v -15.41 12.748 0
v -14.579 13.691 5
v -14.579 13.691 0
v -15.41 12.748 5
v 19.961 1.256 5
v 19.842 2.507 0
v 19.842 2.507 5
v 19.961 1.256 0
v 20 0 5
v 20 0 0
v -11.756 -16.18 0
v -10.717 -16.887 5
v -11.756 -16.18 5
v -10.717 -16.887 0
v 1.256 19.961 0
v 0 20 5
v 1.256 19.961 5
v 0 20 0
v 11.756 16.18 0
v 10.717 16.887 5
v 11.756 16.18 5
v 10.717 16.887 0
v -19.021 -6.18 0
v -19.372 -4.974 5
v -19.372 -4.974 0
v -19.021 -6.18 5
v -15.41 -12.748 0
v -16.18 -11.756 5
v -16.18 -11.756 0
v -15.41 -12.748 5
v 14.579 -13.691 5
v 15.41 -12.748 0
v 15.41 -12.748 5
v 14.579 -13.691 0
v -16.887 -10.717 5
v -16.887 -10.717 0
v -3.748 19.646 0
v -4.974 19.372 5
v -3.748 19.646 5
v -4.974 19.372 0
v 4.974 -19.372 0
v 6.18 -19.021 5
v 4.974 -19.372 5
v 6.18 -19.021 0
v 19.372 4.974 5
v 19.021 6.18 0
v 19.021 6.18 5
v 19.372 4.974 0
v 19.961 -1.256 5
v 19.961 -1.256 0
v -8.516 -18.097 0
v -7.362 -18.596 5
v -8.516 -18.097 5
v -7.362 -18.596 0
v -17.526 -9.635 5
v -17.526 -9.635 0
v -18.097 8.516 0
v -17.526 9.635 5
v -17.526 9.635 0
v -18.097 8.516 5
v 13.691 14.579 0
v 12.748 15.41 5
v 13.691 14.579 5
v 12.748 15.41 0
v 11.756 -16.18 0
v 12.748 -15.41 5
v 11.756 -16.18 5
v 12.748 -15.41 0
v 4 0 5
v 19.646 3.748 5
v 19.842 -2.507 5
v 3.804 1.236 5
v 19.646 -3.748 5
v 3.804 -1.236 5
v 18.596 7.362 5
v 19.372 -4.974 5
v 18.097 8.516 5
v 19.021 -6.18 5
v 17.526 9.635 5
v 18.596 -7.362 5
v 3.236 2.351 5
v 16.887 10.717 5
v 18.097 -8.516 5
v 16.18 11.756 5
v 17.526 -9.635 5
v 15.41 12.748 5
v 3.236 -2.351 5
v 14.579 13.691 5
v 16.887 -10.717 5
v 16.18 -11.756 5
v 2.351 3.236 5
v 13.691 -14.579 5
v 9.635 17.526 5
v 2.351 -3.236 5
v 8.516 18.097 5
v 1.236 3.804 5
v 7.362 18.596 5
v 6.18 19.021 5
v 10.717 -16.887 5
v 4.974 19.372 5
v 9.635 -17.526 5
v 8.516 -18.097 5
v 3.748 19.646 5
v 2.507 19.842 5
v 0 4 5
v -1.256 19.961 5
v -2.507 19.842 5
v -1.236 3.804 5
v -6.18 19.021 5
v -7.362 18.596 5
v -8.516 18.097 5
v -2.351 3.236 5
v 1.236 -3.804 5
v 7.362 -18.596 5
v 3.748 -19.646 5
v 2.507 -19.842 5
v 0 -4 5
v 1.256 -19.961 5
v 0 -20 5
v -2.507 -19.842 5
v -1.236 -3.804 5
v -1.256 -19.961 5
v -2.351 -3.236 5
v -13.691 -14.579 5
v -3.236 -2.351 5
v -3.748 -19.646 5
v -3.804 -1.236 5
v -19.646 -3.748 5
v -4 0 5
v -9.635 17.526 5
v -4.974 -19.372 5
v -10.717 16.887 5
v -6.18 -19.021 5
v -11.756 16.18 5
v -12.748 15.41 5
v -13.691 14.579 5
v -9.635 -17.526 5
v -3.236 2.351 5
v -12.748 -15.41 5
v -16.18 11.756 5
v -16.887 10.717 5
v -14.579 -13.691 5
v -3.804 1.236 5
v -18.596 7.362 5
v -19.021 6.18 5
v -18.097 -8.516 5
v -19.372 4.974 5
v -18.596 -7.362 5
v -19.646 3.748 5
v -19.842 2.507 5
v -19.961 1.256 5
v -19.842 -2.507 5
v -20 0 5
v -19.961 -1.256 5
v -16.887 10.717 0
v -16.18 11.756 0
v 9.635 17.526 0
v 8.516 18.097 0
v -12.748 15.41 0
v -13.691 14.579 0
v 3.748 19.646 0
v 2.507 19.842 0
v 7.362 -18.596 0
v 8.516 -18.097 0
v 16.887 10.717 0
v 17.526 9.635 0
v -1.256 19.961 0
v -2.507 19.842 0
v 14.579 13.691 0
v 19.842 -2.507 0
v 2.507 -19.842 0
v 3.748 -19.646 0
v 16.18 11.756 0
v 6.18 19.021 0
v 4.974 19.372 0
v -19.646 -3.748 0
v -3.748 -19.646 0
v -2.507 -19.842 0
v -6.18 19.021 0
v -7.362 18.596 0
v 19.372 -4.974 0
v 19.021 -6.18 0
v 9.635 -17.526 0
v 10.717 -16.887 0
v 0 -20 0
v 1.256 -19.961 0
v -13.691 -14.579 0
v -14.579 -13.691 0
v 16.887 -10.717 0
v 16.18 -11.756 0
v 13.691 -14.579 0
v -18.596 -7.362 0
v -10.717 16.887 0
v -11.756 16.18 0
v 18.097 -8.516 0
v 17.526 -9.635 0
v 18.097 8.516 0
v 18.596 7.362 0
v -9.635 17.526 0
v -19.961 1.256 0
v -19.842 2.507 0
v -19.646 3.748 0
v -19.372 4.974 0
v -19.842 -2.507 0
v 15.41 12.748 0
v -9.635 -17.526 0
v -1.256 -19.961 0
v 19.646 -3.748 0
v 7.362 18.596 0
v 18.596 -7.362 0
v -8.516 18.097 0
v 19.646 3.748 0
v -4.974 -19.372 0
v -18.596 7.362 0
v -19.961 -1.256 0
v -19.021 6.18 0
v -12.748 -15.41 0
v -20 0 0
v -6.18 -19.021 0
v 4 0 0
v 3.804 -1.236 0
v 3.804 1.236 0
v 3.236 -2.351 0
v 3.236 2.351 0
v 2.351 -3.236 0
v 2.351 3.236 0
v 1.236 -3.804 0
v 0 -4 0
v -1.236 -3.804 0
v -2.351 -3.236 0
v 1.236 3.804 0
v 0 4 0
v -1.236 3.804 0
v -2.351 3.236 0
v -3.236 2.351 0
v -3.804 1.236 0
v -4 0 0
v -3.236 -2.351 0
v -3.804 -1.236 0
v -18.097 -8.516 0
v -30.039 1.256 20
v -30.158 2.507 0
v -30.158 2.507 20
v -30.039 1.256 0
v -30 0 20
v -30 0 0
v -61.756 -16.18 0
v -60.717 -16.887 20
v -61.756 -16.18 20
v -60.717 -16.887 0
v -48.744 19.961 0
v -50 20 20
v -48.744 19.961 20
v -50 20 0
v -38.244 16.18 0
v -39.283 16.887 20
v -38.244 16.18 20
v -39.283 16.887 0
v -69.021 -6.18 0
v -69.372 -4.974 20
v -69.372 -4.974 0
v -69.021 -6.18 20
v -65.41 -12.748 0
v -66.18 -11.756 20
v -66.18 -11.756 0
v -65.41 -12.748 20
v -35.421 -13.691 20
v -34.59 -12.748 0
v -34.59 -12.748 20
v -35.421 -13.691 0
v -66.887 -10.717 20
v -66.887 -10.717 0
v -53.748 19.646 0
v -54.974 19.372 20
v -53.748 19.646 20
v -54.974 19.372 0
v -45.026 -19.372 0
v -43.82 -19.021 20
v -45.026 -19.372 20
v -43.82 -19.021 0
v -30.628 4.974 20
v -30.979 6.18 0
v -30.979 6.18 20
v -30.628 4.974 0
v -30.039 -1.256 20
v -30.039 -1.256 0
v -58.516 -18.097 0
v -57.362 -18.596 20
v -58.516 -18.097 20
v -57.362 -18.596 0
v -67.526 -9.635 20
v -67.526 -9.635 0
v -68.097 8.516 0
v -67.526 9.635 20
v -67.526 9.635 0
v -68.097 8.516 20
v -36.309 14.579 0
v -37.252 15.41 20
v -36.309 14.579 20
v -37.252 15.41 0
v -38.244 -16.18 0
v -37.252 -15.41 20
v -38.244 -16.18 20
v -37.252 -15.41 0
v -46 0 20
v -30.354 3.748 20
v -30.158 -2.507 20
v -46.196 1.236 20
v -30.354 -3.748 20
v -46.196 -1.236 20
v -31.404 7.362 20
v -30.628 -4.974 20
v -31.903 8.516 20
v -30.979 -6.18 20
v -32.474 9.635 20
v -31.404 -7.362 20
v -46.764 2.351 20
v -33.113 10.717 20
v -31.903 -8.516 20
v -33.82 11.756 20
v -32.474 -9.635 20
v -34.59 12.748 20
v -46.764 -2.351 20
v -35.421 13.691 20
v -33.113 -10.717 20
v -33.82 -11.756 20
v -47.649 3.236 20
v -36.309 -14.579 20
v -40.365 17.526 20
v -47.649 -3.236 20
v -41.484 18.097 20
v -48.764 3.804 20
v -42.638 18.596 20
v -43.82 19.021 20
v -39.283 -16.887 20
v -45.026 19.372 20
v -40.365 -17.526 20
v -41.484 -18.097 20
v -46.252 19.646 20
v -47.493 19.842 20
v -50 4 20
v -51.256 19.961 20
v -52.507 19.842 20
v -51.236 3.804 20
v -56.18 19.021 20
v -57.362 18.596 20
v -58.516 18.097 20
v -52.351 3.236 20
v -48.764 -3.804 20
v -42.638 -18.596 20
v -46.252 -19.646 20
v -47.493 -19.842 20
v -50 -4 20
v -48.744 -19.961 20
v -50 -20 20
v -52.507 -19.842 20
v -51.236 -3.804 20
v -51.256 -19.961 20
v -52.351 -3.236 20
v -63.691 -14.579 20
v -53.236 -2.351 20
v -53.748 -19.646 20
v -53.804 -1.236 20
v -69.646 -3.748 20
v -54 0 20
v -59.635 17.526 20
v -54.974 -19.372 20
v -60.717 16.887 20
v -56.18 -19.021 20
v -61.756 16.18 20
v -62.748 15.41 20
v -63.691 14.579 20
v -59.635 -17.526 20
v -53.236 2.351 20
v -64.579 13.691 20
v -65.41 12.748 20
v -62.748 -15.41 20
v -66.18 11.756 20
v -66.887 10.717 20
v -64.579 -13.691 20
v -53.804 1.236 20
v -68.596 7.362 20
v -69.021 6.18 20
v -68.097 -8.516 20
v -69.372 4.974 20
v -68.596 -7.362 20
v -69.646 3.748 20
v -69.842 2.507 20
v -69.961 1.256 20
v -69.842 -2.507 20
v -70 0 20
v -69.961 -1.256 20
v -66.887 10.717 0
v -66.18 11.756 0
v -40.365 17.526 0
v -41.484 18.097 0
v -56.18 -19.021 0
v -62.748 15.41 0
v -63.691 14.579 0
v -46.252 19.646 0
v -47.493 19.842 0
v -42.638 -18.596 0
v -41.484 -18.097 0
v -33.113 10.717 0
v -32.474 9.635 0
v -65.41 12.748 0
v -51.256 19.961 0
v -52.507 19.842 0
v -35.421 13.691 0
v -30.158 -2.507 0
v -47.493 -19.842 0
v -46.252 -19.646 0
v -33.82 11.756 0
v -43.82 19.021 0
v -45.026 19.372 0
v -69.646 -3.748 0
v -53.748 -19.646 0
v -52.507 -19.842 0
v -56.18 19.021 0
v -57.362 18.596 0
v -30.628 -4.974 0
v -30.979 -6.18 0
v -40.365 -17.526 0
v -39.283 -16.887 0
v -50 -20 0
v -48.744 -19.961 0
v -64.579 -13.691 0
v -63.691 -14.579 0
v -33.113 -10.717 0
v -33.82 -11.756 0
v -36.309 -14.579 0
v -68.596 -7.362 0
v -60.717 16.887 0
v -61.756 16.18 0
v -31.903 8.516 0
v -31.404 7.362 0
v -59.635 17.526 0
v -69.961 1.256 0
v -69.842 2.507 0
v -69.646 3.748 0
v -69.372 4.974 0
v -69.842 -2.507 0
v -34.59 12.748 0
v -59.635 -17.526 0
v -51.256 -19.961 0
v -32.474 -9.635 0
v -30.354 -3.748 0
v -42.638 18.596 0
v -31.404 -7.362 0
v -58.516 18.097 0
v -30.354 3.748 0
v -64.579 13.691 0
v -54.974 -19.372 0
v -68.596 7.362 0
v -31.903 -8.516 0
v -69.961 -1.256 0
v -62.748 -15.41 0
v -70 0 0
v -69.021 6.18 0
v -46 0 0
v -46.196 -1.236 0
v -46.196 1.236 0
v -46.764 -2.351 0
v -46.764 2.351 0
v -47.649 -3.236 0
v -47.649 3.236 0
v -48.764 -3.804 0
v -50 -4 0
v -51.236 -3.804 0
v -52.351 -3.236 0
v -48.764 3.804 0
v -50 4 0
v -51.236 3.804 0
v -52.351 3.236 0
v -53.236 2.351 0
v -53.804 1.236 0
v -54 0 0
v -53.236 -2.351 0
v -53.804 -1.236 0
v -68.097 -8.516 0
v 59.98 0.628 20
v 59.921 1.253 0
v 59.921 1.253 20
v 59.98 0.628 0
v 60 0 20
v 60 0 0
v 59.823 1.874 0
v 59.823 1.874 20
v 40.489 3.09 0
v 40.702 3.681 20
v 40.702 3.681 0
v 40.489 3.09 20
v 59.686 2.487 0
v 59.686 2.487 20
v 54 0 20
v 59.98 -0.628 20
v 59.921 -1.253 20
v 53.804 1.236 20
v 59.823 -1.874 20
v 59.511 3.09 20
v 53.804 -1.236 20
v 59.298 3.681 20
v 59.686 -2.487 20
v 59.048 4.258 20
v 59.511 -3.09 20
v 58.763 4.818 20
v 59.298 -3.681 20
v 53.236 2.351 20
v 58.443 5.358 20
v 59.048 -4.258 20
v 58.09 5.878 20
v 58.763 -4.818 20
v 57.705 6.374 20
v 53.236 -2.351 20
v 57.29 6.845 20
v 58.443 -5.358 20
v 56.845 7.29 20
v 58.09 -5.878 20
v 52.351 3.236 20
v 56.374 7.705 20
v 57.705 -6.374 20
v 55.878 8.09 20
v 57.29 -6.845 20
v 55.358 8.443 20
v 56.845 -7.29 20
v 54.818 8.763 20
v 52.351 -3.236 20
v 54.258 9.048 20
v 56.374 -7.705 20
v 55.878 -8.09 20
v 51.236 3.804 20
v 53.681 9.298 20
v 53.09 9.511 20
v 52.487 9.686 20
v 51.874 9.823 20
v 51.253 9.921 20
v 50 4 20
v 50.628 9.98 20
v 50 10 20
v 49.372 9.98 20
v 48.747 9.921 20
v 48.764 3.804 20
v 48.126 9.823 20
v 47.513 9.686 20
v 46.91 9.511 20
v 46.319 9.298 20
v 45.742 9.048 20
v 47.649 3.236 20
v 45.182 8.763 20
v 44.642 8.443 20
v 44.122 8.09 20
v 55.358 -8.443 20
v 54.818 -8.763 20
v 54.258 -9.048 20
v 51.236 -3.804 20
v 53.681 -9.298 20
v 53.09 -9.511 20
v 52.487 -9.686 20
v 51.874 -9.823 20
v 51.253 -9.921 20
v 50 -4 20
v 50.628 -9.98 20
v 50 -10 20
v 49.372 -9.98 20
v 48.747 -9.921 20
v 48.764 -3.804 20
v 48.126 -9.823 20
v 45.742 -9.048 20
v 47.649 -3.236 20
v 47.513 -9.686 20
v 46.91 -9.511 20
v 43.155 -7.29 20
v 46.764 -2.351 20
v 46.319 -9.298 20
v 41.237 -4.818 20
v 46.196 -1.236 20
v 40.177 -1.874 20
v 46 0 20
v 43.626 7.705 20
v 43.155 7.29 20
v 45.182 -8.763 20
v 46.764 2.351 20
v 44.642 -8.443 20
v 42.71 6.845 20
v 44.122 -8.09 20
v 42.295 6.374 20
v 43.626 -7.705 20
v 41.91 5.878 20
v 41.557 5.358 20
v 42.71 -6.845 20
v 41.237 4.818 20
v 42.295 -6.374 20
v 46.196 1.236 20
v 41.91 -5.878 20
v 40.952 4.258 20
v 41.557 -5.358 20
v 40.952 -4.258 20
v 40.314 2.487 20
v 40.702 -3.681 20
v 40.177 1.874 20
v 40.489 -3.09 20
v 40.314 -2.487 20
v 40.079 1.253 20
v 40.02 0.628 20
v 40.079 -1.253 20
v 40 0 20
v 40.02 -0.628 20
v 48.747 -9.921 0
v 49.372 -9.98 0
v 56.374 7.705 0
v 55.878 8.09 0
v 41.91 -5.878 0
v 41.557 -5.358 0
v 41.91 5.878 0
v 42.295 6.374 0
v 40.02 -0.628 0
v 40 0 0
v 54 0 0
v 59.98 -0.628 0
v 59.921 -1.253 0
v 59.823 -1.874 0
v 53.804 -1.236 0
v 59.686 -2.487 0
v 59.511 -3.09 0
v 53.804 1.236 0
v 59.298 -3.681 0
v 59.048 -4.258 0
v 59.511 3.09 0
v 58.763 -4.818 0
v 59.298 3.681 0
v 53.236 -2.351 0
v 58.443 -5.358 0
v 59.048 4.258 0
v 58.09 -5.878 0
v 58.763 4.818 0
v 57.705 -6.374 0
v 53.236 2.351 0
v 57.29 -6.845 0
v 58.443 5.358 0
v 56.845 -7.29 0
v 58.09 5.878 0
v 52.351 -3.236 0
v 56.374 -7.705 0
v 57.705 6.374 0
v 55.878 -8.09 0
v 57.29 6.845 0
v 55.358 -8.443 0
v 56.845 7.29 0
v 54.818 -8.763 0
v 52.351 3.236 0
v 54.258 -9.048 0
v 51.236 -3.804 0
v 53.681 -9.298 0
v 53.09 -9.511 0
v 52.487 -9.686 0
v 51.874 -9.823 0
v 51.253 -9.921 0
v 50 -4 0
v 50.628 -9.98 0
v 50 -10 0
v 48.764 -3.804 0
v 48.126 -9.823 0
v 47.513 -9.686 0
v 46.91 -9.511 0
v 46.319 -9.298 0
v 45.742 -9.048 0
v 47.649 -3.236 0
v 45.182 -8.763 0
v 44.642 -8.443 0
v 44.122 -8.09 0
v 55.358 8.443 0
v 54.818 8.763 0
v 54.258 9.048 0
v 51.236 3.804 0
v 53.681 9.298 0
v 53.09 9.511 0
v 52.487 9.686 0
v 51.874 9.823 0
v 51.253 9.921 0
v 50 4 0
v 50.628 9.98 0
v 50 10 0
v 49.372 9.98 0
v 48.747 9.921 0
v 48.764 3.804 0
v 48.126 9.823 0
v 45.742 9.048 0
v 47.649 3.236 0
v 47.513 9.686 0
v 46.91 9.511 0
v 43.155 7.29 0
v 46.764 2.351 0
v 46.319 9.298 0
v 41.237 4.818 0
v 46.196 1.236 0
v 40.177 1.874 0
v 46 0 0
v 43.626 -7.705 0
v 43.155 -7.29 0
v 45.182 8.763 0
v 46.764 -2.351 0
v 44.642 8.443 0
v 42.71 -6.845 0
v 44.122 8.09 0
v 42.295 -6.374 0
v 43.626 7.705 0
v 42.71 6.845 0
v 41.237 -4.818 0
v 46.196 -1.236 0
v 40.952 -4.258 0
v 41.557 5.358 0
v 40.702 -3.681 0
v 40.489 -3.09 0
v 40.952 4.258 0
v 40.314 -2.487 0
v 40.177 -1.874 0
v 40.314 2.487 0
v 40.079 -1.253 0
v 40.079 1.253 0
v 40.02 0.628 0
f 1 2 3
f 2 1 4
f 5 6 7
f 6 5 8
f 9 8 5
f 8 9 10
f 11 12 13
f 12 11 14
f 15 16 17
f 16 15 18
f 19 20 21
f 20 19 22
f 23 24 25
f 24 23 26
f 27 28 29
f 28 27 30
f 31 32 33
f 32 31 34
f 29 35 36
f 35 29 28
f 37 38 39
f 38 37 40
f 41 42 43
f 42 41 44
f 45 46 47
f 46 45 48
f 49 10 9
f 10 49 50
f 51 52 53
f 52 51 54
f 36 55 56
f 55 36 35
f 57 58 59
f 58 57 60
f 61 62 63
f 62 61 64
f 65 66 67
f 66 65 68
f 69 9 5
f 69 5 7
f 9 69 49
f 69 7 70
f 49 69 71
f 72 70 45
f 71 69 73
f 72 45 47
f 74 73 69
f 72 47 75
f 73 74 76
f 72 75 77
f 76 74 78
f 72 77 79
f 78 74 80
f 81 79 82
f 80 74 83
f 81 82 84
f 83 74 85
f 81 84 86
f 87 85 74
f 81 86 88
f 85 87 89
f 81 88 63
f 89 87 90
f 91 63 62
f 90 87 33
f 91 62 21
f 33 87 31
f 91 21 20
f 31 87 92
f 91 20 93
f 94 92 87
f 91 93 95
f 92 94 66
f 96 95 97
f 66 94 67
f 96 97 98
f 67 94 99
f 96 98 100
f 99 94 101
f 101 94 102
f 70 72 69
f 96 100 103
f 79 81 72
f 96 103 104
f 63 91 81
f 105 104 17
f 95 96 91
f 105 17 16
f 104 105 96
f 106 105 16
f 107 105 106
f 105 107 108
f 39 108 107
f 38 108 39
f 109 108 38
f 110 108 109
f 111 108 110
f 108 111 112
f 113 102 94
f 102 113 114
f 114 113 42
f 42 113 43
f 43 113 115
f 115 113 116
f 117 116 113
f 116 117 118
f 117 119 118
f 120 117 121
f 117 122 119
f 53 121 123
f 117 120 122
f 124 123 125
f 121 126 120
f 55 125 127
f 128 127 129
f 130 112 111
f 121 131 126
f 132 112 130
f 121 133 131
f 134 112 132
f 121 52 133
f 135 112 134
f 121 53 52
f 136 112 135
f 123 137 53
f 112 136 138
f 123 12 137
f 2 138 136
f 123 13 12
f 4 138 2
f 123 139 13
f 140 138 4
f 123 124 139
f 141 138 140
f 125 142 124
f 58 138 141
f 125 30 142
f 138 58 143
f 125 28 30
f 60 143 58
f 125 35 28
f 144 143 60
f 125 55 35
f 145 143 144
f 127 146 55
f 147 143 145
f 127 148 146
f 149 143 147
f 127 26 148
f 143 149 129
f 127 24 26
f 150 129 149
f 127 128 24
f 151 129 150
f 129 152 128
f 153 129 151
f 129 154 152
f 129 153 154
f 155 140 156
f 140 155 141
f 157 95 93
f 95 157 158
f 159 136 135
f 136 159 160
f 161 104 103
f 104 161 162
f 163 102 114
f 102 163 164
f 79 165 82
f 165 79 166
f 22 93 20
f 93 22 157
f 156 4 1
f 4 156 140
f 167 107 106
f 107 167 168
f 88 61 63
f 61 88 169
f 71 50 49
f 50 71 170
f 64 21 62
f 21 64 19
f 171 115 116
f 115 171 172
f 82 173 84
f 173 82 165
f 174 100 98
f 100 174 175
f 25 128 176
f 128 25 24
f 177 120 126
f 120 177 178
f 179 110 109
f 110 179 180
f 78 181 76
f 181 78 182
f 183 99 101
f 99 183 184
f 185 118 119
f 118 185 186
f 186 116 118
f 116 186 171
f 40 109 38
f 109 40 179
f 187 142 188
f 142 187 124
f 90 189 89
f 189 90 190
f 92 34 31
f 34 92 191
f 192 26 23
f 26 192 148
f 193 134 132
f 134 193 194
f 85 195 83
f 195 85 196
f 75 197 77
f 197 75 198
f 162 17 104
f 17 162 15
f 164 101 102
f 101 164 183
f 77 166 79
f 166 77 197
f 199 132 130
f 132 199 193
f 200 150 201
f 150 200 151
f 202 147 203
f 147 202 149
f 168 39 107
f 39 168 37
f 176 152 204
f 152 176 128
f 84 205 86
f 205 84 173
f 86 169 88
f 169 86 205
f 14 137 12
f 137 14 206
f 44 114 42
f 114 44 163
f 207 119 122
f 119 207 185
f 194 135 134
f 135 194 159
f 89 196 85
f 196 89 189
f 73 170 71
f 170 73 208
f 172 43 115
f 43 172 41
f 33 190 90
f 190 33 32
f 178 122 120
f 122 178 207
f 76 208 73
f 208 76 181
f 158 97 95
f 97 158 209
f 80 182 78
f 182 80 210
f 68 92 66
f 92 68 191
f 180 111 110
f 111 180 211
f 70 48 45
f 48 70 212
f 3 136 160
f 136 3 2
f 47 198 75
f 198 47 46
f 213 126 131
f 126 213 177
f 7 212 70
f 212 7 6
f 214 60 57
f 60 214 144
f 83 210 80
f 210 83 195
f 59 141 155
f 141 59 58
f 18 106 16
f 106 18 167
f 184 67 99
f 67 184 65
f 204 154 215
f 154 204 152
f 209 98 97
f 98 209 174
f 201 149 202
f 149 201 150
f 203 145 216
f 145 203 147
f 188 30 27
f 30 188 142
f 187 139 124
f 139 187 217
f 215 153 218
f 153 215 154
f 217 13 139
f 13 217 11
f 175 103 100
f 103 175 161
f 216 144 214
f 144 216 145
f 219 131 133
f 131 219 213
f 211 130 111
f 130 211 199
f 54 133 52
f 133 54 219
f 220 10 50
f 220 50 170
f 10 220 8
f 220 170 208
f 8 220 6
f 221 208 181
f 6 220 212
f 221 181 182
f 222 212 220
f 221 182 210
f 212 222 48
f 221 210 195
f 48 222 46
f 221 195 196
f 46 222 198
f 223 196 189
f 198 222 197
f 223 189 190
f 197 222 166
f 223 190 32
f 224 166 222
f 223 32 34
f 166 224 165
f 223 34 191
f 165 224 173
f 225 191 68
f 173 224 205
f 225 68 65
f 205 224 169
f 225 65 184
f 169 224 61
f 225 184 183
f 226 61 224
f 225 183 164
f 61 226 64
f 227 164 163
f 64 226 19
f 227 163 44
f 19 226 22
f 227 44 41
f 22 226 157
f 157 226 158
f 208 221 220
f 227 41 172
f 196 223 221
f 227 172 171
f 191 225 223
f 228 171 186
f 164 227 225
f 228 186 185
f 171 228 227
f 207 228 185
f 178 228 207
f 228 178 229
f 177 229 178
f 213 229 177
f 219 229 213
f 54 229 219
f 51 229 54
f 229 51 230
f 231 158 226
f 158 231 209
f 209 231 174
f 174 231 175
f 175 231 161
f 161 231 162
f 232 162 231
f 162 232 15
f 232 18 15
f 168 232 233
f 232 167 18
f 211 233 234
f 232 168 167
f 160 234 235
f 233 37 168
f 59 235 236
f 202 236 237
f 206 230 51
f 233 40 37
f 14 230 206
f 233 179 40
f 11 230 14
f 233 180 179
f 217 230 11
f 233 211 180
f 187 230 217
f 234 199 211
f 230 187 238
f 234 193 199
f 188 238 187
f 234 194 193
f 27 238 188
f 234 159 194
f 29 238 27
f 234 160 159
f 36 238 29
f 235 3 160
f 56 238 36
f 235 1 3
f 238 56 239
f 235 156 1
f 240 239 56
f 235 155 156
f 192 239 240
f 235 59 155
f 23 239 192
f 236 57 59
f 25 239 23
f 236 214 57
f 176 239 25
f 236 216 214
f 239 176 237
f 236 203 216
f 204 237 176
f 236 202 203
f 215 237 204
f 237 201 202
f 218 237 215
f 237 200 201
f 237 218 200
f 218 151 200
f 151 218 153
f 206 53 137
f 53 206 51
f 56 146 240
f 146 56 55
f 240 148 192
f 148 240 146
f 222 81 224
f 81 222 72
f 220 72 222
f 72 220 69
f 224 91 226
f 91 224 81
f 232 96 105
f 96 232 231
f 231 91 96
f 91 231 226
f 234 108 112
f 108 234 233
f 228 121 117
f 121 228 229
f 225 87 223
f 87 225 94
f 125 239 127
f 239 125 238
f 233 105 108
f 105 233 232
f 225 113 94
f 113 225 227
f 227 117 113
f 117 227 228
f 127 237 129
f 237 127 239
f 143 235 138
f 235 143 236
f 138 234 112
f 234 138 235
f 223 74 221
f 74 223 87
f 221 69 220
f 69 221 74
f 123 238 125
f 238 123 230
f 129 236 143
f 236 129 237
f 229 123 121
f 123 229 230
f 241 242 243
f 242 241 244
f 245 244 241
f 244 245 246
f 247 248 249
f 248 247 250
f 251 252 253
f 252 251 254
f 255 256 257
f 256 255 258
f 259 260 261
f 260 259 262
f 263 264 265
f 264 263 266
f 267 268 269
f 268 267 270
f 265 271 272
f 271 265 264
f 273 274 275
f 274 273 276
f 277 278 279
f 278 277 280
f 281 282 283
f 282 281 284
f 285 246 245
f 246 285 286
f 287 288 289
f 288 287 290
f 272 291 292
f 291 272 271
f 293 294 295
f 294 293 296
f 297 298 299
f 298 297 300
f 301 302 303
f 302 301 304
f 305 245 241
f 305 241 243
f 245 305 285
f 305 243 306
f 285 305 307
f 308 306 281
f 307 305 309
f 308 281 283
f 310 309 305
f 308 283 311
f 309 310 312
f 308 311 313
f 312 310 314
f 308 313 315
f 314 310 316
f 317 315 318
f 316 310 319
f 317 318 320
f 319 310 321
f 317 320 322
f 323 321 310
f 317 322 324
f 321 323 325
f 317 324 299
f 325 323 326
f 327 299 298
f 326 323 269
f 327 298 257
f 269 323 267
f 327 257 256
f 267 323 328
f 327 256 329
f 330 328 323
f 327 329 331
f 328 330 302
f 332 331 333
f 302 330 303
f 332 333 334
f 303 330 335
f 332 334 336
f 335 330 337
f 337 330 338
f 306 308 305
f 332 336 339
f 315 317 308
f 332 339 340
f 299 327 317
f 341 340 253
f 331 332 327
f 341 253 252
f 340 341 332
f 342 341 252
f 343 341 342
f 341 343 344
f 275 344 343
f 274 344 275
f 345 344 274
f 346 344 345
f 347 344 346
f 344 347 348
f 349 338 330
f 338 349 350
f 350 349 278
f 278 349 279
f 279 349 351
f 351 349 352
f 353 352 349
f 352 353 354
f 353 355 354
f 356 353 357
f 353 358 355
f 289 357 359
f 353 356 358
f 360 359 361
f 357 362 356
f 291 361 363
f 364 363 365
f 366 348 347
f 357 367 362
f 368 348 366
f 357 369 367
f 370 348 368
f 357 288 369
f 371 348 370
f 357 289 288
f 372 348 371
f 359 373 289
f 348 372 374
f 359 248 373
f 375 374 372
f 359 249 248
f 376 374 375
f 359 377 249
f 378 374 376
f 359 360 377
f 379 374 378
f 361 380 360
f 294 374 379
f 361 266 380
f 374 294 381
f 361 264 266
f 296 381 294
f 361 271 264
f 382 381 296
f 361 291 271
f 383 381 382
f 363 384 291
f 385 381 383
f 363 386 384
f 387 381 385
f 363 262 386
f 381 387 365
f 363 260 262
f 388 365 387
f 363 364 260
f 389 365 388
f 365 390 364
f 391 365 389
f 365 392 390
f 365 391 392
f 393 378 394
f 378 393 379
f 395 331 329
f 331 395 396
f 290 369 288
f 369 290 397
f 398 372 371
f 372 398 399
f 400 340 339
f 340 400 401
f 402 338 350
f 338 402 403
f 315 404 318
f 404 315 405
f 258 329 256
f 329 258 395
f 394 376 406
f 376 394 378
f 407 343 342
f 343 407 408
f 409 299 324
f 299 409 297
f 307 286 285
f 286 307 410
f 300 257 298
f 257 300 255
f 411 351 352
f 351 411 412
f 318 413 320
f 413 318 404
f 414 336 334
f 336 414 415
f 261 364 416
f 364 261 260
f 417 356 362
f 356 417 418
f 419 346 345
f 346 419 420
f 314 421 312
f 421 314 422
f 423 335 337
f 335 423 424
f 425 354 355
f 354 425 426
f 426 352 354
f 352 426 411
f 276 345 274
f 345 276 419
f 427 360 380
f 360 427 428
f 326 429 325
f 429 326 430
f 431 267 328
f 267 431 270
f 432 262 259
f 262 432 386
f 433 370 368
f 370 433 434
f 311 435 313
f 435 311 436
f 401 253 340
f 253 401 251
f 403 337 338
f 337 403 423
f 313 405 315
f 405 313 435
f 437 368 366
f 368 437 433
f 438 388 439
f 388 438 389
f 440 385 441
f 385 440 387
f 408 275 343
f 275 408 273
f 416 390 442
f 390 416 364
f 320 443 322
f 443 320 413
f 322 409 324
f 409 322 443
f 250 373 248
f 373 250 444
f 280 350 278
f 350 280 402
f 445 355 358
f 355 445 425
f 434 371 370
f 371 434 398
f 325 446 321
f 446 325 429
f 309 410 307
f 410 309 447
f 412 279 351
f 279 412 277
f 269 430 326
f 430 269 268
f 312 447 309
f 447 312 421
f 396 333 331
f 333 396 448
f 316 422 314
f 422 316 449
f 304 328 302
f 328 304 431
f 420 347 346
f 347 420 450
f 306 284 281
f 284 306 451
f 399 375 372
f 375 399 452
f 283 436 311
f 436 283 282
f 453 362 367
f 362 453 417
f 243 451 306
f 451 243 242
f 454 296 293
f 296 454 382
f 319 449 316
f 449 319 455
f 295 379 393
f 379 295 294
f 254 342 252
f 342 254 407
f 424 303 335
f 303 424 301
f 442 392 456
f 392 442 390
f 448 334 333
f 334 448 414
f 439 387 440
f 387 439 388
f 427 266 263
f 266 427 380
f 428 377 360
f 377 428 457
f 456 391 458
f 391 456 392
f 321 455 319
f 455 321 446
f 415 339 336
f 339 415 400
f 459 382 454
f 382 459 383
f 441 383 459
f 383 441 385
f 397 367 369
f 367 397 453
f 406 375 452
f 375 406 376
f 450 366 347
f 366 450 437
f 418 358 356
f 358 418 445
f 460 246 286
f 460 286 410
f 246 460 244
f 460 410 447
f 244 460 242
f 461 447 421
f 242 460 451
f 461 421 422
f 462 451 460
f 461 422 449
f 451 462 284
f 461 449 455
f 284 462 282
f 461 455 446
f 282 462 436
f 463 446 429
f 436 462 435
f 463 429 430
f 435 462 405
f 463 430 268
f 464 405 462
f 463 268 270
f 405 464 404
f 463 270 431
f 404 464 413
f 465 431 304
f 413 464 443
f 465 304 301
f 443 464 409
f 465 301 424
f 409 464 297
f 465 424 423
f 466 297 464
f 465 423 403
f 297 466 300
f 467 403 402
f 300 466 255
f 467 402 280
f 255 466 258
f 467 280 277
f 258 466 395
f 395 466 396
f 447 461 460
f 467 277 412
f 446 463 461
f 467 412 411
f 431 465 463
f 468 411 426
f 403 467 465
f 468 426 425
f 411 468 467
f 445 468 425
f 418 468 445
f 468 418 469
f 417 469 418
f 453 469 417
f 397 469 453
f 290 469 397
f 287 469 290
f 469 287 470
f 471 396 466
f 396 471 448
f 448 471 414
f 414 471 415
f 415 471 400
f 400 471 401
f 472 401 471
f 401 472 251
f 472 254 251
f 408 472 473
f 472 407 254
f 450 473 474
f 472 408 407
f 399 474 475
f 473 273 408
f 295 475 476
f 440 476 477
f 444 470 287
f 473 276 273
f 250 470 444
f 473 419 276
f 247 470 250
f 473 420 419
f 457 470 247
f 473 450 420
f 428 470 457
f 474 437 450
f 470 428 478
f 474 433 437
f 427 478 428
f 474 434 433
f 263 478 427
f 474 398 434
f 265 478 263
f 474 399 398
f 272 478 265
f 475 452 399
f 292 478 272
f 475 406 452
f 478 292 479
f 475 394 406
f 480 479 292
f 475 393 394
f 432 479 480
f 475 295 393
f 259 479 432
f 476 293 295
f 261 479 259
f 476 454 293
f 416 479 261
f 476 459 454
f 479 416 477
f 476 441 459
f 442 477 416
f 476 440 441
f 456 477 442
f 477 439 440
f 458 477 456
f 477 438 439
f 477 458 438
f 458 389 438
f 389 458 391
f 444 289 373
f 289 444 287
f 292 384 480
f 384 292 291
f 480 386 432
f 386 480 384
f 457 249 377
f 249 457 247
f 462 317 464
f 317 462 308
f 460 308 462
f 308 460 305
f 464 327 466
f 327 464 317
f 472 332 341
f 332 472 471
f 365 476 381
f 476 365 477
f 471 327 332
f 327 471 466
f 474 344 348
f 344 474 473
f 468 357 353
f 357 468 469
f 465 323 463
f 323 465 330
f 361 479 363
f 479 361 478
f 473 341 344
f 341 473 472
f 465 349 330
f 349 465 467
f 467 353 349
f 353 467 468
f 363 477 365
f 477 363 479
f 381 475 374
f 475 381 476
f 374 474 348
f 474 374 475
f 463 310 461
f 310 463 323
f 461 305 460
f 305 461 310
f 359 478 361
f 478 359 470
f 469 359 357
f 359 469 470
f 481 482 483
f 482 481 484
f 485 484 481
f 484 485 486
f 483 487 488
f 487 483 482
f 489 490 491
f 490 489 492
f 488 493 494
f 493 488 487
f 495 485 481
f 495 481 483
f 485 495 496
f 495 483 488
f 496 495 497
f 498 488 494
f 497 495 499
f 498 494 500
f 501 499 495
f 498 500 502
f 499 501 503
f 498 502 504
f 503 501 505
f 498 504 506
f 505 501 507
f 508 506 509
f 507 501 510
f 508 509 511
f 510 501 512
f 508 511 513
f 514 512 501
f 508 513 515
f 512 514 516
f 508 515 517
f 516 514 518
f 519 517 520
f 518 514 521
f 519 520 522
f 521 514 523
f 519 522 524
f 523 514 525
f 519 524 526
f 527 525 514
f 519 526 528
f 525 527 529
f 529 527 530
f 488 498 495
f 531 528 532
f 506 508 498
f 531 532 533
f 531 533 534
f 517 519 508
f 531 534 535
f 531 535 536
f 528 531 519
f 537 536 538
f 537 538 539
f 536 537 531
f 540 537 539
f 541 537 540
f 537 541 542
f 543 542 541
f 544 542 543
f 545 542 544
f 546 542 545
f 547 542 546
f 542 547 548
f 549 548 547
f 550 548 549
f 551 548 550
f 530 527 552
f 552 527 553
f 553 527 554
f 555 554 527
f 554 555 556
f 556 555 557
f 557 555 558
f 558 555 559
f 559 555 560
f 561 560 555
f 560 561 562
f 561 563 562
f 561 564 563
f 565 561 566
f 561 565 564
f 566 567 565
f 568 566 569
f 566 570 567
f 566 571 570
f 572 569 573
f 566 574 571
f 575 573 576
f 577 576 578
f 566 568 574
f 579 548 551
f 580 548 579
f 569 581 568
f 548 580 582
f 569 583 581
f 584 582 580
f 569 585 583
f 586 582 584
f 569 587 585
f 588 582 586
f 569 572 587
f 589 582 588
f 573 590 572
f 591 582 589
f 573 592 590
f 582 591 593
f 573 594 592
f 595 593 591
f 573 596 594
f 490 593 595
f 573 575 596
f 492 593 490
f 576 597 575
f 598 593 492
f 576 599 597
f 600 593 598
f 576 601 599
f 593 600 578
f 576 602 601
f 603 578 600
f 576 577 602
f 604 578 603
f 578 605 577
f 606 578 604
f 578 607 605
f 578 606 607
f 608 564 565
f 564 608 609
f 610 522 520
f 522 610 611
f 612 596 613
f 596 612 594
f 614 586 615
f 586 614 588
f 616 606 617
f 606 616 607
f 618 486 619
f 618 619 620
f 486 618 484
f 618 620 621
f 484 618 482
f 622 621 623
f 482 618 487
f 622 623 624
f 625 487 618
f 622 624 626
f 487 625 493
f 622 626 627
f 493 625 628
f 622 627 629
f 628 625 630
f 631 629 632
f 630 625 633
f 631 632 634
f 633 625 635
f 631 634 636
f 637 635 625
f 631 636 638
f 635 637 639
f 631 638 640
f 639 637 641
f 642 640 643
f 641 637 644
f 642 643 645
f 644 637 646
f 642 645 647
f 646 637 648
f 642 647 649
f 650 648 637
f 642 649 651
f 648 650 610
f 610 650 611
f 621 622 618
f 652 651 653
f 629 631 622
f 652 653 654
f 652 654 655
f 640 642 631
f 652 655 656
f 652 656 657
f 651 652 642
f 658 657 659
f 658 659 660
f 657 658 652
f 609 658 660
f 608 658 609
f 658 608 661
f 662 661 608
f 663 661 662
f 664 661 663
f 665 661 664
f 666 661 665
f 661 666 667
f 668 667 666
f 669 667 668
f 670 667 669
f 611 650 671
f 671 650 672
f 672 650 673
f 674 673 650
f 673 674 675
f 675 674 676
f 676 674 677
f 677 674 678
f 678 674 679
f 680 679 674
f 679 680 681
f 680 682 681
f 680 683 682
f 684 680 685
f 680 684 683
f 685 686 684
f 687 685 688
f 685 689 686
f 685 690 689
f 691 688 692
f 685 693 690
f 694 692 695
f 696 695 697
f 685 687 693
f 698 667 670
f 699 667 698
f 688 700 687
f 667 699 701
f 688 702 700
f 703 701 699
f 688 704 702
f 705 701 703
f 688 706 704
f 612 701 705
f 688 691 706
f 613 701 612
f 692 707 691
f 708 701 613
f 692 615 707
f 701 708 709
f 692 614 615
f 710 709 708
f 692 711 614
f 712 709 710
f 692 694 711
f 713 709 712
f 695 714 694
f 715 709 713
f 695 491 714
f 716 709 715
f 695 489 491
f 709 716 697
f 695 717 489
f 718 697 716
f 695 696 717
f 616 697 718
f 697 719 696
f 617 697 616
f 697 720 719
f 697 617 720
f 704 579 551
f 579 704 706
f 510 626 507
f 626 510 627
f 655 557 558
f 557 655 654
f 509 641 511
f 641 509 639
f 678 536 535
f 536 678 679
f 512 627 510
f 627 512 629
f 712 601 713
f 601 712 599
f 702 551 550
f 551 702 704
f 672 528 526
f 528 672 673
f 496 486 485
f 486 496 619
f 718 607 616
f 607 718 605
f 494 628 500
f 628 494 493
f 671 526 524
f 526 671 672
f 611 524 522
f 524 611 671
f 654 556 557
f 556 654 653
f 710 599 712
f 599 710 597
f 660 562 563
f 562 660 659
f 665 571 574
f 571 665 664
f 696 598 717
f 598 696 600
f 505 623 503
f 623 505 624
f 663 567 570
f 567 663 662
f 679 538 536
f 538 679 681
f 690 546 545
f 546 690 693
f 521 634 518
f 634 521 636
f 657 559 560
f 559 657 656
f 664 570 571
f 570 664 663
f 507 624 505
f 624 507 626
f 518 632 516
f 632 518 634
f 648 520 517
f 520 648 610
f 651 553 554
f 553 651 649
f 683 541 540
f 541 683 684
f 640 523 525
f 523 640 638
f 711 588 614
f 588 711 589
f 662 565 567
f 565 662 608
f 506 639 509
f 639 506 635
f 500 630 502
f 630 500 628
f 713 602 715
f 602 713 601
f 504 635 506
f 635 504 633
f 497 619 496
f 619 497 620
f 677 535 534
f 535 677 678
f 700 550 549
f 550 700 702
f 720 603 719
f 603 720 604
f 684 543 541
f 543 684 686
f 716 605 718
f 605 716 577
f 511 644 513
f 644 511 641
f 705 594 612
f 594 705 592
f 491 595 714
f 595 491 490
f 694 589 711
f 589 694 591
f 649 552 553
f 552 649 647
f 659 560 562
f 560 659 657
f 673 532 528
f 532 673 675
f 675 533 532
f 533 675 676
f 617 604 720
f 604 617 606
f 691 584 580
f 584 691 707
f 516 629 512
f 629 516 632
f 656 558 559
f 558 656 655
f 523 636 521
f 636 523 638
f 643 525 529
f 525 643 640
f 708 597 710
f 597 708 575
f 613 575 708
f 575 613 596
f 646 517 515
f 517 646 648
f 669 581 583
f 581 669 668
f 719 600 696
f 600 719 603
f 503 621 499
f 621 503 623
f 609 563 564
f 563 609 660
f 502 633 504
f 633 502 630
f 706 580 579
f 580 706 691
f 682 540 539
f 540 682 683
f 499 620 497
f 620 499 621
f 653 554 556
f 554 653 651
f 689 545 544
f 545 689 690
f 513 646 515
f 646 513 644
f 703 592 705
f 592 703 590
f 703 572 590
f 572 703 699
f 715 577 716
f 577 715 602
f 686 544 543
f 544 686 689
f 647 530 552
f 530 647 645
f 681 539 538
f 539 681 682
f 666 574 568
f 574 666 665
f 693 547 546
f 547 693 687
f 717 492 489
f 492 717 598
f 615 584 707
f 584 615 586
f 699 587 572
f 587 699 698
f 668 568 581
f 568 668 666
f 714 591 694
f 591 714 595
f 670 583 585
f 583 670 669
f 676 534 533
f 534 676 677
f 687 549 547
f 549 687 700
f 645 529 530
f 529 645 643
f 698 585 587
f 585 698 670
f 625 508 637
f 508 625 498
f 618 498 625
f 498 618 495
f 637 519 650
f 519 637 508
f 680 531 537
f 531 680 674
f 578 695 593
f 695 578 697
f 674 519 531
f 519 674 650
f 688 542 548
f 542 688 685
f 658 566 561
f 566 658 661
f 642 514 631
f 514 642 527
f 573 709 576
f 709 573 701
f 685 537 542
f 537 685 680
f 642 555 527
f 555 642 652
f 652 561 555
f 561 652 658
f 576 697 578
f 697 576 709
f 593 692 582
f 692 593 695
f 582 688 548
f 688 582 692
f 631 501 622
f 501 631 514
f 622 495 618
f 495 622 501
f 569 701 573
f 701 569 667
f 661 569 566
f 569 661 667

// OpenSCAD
// file: utils/build_plate.scad
// Build Plate representation module
// Made by Makerbot (http://curriculum.makerbot.com/daily_lessons/february/openscad_buildplate.html)

//use this to include a build plate visualization in your openSCAD scripts. Very useful for things designed to be edited in Makerbot Customizer

//to use, either include or use <utils/build_plate.scad>

//then just call build_plate(); with the following arguments (also, you have to have a real object in your scene for this to render)

//putting 0 as the first argument will give you a Replicator 2 build plate
//putting 1 as the first argument will give you a Replicator 1 build plate
//putting 2 as the first argument will give you a Thingomatic build plate
//putting 3 as the first argument will give you a manually adjustable build plate (note: if you use this option, you need to specify your build plates X length (in mm) as the second argument and the Y length (in mm) as the third argument. eg. build_plate(3,150,120);)

/*

to give your user control of which build plate they see in Customizer, include the following code:

use <utils/build_plate.scad>

//for display only, doesn't contribute to final object
build_plate_selector = 0; //[0:Replicator 2,1: Replicator,2:Thingomatic,3:Manual]
//when Build Plate Selector is set to "manual" this controls the build plate x dimension
build_plate_manual_x = 100; //[100:400]
//when Build Plate Selector is set to "manual" this controls the build plate y dimension
build_plate_manual_y = 100; //[100:400]

build_plate(build_plate_selector,build_plate_manual_x,build_plate_manual_y);

*/




//to see how this works, uncomment the following code

//build_plate_selector = 0; //[0:Replicator 2,1: Replicator,2:Thingomatic,3:Manual]
//build_plate_manual_x = 100; //[100:400]
//build_plate_manual_y = 100; //[100:400]
//
//build_plate(build_plate_selector,build_plate_manual_x,build_plate_manual_y);
//
//cube(5);


module build_plate(bp,manX,manY){

		translate([0,0,-.52]){
			if(bp == 0){
				%cube([285,153,1],center = true);
			}
			if(bp == 1){
				%cube([225,145,1],center = true);
			}
			if(bp == 2){
				%cube([120,120,1],center = true);
			}
			if(bp == 3){
				%cube([manX,manY,1],center = true);
			}
		
		}
		translate([0,0,-.5]){
			if(bp == 0){
				for(i = [-14:14]){
					translate([i*10,0,0])
					%cube([.5,153,1.01],center = true);
				}
				for(i = [-7:7]){
					translate([0,i*10,0])
					%cube([285,.5,1.01],center = true);
				}	
			}
			if(bp == 1){
				for(i = [-11:11]){
					translate([i*10,0,0])
						%cube([.5,145,1.01],center = true);
				}
				for(i = [-7:7]){
					translate([0,i*10,0])
						%cube([225,.5,1.01],center = true);
				}
			}
			if(bp == 2){
				for(i = [-6:6]){
					translate([i*10,0,0])
						%cube([.5,120,1.01],center = true);
				}
				for(i = [-6:6]){
					translate([0,i*10,0])
						%cube([120,.5,1.01],center = true);
				}
			}
			if(bp == 3){
				for(i = [-(floor(manX/20)):floor(manX/20)]){
					translate([i*10,0,0])
						%cube([.5,manY,1.01],center = true);
				}
				for(i = [-(floor(manY/20)):floor(manY/20)]){
					translate([0,i*10,0])
						%cube([manX,.5,1.01],center = true);
				}
			}
		}
}
// main file
use <./utils/build_plate.scad> // Cuadricula transparente para la base
build_plate(3, 200,100); // No se incluye al renderizar


module rueda_simple(grosor=5, diametro=40, diam_eje=8)
{
  //-- Construcción de la rueda a partir de
  //-- los parámetros
  difference() {
    //-- Base de la rueda
    cylinder(r=diametro/2, h=grosor,$fn=100);

    //-- Taladro del eje
    cylinder(r=diam_eje/2, h=3*grosor,$fn=20,center=true);
  }
}

//-- Ejemplos de uso del modulo
//-- Rueda por defecto
rueda_simple();

translate([-50,0,0])
  rueda_simple(grosor=20);

translate([50,0,0])
  rueda_simple(grosor=20, diametro=20);
